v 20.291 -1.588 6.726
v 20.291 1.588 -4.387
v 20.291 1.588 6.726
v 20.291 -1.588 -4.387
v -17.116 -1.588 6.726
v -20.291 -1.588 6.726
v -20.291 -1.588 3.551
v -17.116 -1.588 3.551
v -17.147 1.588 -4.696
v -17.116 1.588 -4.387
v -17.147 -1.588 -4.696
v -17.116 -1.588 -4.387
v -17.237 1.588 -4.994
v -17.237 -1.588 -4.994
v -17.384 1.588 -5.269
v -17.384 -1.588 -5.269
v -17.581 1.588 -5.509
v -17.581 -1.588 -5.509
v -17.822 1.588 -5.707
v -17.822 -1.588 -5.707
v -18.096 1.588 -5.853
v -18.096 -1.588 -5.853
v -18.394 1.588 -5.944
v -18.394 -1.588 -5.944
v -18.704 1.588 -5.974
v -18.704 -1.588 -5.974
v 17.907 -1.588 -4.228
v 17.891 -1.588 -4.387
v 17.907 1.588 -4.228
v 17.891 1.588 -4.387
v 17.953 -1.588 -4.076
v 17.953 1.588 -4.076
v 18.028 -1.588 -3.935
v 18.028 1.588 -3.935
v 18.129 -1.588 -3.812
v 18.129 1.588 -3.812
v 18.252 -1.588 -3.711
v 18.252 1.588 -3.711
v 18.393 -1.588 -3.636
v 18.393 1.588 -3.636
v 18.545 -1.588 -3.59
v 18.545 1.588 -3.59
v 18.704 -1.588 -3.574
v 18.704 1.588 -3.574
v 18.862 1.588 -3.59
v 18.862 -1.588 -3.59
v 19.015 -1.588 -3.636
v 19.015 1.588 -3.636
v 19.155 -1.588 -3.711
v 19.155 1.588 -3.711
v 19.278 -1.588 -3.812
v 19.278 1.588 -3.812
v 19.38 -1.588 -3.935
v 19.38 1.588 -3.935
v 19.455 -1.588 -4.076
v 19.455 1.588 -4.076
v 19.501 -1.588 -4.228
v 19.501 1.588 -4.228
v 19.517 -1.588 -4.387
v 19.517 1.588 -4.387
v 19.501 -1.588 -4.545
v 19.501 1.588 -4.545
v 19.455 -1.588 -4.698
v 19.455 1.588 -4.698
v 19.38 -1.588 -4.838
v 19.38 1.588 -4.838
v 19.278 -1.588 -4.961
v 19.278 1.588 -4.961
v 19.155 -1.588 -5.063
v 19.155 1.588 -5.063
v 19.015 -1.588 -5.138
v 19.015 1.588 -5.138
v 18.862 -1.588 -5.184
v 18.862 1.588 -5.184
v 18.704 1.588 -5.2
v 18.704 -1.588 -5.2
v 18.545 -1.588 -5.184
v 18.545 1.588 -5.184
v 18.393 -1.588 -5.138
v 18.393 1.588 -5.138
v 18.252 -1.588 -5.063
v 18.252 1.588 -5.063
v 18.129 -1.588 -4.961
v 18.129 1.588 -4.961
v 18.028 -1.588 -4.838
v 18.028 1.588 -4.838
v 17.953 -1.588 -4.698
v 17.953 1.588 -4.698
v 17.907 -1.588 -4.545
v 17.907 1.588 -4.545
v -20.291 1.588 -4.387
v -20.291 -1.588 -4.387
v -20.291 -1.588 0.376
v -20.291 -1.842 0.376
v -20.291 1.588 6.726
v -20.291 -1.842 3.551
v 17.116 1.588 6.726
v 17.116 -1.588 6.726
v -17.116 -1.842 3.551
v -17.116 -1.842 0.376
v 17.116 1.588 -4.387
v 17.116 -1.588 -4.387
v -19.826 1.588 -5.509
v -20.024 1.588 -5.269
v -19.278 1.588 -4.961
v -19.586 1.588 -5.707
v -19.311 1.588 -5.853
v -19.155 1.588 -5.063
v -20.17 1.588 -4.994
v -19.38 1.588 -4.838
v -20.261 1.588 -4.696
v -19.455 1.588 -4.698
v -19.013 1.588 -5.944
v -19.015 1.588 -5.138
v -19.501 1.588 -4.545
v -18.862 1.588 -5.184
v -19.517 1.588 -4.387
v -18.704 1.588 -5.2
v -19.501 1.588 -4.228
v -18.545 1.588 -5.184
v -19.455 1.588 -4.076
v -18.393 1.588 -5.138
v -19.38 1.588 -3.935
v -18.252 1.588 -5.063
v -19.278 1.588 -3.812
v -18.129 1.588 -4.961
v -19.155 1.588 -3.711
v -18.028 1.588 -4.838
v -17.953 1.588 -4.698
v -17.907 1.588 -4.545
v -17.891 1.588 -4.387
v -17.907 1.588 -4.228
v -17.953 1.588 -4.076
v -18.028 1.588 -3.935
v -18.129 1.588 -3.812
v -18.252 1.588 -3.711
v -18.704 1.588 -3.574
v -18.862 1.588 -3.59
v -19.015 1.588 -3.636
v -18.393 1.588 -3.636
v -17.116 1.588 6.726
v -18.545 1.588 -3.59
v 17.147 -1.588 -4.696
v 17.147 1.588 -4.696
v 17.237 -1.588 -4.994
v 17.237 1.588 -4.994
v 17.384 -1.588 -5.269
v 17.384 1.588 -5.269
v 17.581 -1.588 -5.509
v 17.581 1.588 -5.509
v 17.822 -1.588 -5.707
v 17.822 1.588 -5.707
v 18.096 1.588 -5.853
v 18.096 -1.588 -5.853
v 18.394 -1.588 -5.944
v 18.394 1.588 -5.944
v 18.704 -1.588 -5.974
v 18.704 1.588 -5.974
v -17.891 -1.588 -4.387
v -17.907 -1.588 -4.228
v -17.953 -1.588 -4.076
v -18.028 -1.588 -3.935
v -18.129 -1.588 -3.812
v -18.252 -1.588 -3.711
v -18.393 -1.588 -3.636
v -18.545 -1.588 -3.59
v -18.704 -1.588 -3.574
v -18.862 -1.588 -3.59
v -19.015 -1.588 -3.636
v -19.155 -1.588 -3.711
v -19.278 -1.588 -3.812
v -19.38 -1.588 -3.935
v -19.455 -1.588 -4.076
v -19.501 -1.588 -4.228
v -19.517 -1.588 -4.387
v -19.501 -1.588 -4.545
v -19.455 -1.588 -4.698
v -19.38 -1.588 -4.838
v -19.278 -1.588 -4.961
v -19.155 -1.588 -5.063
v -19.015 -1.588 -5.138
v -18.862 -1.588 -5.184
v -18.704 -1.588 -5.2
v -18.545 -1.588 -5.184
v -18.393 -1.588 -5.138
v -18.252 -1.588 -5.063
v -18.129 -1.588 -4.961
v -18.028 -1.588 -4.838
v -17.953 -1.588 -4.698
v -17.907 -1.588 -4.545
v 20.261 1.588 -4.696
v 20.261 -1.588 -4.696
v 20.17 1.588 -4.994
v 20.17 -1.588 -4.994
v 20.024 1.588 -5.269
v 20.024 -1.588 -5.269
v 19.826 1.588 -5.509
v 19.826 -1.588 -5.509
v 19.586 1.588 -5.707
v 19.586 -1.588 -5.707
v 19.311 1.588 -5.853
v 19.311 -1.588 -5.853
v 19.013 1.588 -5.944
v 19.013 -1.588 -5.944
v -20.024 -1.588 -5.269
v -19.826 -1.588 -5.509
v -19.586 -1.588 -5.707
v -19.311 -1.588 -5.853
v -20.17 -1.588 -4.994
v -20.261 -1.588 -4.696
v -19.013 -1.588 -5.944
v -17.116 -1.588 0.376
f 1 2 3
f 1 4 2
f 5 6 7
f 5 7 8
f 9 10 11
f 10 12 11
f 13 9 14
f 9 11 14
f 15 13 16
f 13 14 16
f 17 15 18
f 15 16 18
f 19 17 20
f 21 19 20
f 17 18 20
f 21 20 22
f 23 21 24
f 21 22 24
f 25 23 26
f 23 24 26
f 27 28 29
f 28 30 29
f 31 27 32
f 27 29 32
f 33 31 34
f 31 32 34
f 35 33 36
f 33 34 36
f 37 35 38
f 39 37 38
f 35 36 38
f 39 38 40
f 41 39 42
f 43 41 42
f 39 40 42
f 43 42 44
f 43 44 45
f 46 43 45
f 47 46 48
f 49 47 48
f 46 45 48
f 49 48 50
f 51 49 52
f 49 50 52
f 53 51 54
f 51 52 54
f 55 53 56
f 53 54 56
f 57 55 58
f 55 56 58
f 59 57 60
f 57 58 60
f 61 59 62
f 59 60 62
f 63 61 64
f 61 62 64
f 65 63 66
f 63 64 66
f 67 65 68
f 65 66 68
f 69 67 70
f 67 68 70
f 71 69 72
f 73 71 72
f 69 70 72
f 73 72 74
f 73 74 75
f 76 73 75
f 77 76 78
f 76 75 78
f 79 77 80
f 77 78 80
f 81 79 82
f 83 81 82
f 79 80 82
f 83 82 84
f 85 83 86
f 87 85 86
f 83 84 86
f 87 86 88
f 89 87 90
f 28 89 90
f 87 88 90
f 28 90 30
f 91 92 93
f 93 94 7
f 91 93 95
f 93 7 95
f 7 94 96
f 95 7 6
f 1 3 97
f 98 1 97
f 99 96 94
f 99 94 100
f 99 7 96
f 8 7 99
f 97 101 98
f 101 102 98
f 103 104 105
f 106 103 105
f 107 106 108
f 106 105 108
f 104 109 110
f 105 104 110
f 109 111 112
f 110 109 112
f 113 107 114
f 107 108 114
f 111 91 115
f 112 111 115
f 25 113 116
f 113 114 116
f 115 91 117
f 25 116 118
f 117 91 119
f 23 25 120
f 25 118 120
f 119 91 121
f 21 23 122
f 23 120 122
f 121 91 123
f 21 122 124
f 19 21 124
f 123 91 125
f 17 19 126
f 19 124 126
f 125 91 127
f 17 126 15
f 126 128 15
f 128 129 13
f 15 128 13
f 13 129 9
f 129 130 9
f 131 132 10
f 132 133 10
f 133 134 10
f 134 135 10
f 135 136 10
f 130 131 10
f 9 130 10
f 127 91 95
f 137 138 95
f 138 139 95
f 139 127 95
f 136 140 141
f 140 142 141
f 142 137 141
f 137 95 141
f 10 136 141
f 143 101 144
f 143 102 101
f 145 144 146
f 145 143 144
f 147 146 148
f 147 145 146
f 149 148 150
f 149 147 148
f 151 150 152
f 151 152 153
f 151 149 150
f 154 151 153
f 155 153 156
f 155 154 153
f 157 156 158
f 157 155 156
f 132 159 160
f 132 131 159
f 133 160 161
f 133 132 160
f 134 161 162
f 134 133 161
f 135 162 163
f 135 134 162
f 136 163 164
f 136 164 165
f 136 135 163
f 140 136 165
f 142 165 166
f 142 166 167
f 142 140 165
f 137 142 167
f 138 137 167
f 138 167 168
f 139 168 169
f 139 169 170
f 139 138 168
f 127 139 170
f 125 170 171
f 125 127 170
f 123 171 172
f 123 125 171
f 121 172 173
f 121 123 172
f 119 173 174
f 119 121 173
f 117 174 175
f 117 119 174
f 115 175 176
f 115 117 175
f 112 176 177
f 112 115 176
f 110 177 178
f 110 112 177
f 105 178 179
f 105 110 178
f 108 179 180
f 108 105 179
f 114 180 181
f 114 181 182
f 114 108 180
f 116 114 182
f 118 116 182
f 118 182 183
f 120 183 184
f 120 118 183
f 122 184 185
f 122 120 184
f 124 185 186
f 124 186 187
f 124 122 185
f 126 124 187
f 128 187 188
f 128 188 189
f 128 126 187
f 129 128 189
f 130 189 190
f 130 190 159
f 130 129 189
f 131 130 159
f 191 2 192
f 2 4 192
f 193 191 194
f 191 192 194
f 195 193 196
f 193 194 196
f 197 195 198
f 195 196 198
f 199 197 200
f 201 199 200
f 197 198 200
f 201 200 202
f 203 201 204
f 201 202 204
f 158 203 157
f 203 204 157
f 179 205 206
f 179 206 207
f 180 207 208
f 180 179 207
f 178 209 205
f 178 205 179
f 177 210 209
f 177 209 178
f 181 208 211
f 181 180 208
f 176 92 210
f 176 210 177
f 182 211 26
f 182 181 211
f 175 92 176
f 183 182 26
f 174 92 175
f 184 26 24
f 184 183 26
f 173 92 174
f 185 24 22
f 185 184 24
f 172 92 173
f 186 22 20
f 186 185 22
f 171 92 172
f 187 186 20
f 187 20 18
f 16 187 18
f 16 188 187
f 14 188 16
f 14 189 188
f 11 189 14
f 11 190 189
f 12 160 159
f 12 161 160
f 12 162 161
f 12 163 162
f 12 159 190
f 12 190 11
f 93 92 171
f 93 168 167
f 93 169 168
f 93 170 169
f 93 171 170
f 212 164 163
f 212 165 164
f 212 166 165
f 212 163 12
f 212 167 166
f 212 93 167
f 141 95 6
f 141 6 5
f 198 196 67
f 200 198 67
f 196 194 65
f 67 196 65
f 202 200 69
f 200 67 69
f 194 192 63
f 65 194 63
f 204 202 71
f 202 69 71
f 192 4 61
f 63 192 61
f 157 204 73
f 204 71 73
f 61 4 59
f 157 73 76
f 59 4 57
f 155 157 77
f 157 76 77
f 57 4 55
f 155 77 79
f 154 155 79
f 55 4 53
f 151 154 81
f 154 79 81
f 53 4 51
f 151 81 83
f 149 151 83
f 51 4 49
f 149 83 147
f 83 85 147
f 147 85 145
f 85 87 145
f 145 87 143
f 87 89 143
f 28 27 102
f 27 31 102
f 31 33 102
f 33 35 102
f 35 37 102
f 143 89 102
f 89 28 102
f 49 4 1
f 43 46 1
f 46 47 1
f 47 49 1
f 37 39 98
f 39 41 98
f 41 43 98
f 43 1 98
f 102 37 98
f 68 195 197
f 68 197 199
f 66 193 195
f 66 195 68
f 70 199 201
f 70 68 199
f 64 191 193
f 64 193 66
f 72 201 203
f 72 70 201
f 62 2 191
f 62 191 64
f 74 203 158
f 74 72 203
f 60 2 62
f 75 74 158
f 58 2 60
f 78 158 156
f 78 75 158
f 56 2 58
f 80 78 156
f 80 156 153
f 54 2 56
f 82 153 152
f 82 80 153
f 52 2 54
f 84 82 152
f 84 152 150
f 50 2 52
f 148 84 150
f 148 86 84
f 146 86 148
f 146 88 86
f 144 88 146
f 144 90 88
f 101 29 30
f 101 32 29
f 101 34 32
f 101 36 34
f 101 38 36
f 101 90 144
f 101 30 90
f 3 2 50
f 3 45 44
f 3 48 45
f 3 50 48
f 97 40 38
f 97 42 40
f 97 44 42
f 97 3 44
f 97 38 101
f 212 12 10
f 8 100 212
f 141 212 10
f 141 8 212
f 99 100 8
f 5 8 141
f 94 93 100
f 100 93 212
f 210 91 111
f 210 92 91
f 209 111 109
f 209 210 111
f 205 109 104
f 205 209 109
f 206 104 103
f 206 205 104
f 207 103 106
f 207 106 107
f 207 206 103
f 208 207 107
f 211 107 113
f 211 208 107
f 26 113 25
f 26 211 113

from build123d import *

# Parameters (mm, degrees)
F0_W     = 3.175
F0_H     = 12.7
F0_R     = 0.8128
F1_DEPTH = 1.5875
F2_R     = 1.58749
F4_W     = 3.175
F4_H     = 3.175
F5_DEPTH = 0.254


# Not quite as in the source:
# - a fillet or chamfer is up to 0.001 mm smaller than in the source, because OpenCascade refuses the exact size


with BuildPart() as f1:
    # F0 (on Front) → F1 (new body, symmetric)
    with BuildSketch(Plane.XZ):
        with Locations((-18.7037093565, 0.3757816428)):
            Rectangle(F0_W, F0_H)
        with Locations((-18.7037093565, -4.3867183572)):
            Circle(F0_R, mode=Mode.SUBTRACT)
    extrude(amount=F1_DEPTH, both=True)

    # F2 (radius 1.5875 in the source; OpenCascade refuses exactly that, so slightly less here)
    f2_edges = [f1.edges().sort_by_distance(p)[0] for p in [
        (-20.291209, 0, -5.974218),
        (-17.116209, 0, -5.974218),
    ]]
    fillet(f2_edges, radius=F2_R)


with BuildPart() as f3_1:
    # F3: instance of F1
    add(f1.part.mirror(Plane.YZ))


with BuildPart() as f1_1:
    add(f1.part)

    # F4 (on face) → F5 (join)
    with BuildSketch(Plane.XZ.offset(1.5875)):
        with Locations((-18.7037093565, 1.9632816428)):
            Rectangle(F4_W, F4_H)
    extrude(amount=F5_DEPTH)


solid = Compound([f3_1.part, f1_1.part])
